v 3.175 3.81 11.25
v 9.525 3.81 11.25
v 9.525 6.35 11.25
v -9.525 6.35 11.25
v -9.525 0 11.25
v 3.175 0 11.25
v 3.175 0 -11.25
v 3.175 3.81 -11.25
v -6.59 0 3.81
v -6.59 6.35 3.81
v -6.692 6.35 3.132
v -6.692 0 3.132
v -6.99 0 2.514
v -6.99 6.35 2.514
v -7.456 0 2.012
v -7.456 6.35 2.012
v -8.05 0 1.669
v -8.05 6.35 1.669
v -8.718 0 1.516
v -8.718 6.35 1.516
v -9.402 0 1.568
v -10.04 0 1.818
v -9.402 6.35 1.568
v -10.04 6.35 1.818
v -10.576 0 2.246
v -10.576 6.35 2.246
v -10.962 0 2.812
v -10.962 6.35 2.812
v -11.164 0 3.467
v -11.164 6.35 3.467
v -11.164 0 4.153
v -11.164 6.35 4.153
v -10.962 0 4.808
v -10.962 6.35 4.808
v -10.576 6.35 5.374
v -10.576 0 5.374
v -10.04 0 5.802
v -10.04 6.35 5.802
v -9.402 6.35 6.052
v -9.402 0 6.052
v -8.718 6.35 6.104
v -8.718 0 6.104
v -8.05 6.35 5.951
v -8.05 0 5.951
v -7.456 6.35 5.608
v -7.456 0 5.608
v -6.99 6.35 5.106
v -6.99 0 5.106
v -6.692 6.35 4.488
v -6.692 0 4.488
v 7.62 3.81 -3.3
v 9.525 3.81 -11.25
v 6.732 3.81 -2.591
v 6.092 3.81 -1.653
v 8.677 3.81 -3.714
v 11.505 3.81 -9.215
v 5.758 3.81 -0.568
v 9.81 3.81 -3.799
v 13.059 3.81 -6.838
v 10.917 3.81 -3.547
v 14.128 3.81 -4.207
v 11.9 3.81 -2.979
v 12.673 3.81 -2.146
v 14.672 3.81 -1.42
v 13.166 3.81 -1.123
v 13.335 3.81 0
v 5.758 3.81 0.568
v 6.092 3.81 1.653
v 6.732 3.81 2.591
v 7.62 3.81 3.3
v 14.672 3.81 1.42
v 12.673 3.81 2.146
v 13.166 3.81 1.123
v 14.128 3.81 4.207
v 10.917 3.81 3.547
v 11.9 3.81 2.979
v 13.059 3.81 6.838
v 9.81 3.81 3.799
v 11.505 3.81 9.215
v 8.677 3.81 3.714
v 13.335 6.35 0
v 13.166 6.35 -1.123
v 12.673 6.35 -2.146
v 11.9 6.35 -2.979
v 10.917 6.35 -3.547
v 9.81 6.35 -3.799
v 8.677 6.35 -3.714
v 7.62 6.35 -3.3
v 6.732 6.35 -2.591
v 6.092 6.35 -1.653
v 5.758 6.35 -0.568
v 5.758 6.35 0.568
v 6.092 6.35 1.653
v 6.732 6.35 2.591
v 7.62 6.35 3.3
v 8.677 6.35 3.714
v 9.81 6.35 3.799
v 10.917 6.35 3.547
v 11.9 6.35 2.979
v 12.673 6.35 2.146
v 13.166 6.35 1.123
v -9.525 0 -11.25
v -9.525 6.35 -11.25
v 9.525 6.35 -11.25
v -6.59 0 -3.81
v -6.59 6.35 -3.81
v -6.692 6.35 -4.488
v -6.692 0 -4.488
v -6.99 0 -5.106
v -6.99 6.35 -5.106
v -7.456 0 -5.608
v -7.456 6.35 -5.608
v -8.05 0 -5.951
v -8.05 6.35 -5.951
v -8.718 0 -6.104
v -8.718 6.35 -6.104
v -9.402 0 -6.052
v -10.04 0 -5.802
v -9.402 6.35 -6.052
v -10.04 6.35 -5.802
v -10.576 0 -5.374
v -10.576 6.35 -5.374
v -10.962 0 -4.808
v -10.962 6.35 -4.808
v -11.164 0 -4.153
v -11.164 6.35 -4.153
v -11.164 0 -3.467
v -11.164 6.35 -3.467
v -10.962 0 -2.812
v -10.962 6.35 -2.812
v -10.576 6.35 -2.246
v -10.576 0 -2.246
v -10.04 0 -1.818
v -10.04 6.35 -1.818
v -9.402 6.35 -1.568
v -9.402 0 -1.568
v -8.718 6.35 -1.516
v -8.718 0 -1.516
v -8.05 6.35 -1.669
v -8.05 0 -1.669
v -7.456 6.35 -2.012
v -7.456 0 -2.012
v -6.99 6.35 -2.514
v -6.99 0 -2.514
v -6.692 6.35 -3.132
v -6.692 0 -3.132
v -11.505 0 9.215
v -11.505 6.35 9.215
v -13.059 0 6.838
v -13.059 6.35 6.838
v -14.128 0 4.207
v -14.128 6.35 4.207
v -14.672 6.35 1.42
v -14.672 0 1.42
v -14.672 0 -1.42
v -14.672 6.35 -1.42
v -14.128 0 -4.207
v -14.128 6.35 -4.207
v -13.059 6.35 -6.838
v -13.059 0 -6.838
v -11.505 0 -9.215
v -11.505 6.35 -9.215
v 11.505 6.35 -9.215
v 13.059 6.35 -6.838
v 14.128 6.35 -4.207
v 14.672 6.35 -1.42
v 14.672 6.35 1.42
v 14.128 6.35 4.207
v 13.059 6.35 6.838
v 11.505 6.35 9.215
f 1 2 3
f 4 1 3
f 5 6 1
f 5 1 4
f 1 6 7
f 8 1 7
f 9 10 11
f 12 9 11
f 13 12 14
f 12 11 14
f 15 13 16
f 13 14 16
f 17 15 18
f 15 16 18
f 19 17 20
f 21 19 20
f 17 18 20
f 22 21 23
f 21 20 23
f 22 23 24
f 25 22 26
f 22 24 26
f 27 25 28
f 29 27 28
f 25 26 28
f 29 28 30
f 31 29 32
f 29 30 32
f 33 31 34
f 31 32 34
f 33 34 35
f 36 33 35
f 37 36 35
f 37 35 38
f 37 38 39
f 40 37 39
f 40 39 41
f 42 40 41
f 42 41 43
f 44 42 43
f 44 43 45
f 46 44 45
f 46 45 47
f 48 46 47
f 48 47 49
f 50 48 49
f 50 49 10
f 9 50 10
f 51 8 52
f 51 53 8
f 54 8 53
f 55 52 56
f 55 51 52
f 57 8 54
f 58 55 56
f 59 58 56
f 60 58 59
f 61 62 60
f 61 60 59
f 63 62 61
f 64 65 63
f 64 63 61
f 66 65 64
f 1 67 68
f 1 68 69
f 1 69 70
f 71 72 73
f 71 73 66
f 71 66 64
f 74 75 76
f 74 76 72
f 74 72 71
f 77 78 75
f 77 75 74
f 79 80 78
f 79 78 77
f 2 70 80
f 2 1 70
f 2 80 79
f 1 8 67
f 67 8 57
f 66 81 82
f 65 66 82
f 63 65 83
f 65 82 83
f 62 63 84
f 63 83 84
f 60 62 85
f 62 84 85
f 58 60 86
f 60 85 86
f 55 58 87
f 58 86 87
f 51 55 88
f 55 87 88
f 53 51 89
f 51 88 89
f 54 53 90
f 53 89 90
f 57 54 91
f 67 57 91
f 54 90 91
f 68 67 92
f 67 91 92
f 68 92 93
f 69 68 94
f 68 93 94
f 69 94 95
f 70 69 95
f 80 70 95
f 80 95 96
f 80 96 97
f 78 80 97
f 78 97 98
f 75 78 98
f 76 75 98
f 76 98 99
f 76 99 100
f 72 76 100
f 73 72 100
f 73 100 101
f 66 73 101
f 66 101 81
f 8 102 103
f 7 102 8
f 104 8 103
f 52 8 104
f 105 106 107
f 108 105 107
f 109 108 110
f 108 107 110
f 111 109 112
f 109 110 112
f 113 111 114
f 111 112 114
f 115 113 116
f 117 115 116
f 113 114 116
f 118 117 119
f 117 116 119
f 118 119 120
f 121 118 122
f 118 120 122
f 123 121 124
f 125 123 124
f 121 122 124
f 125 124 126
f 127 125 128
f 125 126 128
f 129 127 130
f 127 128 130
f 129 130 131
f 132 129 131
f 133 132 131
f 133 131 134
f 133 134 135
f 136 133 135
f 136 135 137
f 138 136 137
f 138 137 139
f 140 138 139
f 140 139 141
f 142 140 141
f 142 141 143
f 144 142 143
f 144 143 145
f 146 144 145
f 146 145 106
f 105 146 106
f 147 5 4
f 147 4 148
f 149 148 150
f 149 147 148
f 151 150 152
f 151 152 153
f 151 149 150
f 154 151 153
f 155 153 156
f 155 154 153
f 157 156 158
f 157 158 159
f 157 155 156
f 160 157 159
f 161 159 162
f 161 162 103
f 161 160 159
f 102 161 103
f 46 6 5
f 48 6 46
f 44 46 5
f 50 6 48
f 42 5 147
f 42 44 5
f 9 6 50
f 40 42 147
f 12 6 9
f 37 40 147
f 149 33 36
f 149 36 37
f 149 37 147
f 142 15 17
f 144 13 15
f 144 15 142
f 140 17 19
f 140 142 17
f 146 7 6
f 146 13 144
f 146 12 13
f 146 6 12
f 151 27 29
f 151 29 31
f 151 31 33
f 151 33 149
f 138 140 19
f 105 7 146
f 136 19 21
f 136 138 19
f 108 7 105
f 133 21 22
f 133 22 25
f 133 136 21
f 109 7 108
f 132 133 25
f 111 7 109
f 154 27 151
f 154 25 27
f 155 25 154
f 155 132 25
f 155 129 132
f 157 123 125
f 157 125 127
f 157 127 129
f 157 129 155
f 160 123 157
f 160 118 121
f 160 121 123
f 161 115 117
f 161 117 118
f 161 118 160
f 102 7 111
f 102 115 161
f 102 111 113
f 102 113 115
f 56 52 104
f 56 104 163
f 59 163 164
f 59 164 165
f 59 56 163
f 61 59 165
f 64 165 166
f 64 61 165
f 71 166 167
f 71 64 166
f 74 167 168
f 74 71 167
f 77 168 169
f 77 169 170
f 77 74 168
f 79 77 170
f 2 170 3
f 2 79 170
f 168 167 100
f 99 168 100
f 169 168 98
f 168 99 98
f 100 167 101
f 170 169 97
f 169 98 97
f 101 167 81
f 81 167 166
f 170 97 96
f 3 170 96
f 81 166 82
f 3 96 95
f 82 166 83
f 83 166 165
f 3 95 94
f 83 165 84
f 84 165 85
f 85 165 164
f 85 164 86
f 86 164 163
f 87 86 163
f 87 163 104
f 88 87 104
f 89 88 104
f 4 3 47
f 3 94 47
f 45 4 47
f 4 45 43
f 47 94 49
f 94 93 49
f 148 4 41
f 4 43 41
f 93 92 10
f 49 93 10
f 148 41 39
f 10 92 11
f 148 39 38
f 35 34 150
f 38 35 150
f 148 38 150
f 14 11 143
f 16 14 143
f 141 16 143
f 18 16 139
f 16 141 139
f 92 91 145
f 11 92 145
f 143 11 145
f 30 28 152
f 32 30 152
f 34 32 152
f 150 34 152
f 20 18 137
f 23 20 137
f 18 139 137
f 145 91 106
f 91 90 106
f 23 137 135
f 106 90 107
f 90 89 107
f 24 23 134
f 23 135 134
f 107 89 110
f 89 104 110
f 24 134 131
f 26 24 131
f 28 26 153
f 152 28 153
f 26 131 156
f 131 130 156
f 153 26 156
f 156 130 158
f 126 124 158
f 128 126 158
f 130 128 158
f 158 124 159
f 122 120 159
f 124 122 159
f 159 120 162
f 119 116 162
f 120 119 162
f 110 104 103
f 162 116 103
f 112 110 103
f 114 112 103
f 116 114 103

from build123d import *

# Parameters (mm, degrees)
BOSS_EXTRUDE2_DEPTH = 6.35
SKETCH4_R           = 2.3
SKETCH4_R_2         = 3.81
CUT_EXTRUDE1_DEPTH  = 12.7
CUT_EXTRUDE2_DEPTH  = 3.81


with BuildPart() as part:
    # Sketch3 → Boss-Extrude2 (new body)
    with BuildSketch(Plane(origin=(0, 0, 0), x_dir=(1, 0, 0), z_dir=(0, 1, 0))):
        with BuildLine():
            Line((-9.525, 11.25), (9.525, 11.25))
            ThreePointArc((9.525, 11.25), (14.740696218, 0), (9.525, -11.25))
            Line((9.525, -11.25), (-9.525, -11.25))
            ThreePointArc((-9.525, -11.25), (-14.740696218, 0), (-9.525, 11.25))
        make_face()
    extrude(amount=BOSS_EXTRUDE2_DEPTH)

    # Sketch4 → Cut-Extrude1 (cut)
    with BuildSketch(Plane(origin=(0, 6.35, 0), x_dir=(1, 0, 0), z_dir=(0, 1, 0))):
        with Locations((-8.89, 3.81)):
            Circle(SKETCH4_R)
        with Locations((-8.89, -3.81)):
            Circle(SKETCH4_R)
        with Locations((9.525, 0)):
            Circle(SKETCH4_R_2)
    extrude(amount=-CUT_EXTRUDE1_DEPTH, mode=Mode.SUBTRACT)

    # Sketch5 → Cut-Extrude2 (cut)
    with BuildSketch(Plane.XZ):
        with BuildLine():
            Line((9.525, 11.25), (3.175, 11.25))
            Line((3.175, 11.25), (3.175, -11.25))
            Line((3.175, -11.25), (9.525, -11.25))
            ThreePointArc((9.525, -11.25), (14.740696218, 0), (9.525, 11.25))
        make_face()
    extrude(amount=-CUT_EXTRUDE2_DEPTH, mode=Mode.SUBTRACT)


solid = part.part
